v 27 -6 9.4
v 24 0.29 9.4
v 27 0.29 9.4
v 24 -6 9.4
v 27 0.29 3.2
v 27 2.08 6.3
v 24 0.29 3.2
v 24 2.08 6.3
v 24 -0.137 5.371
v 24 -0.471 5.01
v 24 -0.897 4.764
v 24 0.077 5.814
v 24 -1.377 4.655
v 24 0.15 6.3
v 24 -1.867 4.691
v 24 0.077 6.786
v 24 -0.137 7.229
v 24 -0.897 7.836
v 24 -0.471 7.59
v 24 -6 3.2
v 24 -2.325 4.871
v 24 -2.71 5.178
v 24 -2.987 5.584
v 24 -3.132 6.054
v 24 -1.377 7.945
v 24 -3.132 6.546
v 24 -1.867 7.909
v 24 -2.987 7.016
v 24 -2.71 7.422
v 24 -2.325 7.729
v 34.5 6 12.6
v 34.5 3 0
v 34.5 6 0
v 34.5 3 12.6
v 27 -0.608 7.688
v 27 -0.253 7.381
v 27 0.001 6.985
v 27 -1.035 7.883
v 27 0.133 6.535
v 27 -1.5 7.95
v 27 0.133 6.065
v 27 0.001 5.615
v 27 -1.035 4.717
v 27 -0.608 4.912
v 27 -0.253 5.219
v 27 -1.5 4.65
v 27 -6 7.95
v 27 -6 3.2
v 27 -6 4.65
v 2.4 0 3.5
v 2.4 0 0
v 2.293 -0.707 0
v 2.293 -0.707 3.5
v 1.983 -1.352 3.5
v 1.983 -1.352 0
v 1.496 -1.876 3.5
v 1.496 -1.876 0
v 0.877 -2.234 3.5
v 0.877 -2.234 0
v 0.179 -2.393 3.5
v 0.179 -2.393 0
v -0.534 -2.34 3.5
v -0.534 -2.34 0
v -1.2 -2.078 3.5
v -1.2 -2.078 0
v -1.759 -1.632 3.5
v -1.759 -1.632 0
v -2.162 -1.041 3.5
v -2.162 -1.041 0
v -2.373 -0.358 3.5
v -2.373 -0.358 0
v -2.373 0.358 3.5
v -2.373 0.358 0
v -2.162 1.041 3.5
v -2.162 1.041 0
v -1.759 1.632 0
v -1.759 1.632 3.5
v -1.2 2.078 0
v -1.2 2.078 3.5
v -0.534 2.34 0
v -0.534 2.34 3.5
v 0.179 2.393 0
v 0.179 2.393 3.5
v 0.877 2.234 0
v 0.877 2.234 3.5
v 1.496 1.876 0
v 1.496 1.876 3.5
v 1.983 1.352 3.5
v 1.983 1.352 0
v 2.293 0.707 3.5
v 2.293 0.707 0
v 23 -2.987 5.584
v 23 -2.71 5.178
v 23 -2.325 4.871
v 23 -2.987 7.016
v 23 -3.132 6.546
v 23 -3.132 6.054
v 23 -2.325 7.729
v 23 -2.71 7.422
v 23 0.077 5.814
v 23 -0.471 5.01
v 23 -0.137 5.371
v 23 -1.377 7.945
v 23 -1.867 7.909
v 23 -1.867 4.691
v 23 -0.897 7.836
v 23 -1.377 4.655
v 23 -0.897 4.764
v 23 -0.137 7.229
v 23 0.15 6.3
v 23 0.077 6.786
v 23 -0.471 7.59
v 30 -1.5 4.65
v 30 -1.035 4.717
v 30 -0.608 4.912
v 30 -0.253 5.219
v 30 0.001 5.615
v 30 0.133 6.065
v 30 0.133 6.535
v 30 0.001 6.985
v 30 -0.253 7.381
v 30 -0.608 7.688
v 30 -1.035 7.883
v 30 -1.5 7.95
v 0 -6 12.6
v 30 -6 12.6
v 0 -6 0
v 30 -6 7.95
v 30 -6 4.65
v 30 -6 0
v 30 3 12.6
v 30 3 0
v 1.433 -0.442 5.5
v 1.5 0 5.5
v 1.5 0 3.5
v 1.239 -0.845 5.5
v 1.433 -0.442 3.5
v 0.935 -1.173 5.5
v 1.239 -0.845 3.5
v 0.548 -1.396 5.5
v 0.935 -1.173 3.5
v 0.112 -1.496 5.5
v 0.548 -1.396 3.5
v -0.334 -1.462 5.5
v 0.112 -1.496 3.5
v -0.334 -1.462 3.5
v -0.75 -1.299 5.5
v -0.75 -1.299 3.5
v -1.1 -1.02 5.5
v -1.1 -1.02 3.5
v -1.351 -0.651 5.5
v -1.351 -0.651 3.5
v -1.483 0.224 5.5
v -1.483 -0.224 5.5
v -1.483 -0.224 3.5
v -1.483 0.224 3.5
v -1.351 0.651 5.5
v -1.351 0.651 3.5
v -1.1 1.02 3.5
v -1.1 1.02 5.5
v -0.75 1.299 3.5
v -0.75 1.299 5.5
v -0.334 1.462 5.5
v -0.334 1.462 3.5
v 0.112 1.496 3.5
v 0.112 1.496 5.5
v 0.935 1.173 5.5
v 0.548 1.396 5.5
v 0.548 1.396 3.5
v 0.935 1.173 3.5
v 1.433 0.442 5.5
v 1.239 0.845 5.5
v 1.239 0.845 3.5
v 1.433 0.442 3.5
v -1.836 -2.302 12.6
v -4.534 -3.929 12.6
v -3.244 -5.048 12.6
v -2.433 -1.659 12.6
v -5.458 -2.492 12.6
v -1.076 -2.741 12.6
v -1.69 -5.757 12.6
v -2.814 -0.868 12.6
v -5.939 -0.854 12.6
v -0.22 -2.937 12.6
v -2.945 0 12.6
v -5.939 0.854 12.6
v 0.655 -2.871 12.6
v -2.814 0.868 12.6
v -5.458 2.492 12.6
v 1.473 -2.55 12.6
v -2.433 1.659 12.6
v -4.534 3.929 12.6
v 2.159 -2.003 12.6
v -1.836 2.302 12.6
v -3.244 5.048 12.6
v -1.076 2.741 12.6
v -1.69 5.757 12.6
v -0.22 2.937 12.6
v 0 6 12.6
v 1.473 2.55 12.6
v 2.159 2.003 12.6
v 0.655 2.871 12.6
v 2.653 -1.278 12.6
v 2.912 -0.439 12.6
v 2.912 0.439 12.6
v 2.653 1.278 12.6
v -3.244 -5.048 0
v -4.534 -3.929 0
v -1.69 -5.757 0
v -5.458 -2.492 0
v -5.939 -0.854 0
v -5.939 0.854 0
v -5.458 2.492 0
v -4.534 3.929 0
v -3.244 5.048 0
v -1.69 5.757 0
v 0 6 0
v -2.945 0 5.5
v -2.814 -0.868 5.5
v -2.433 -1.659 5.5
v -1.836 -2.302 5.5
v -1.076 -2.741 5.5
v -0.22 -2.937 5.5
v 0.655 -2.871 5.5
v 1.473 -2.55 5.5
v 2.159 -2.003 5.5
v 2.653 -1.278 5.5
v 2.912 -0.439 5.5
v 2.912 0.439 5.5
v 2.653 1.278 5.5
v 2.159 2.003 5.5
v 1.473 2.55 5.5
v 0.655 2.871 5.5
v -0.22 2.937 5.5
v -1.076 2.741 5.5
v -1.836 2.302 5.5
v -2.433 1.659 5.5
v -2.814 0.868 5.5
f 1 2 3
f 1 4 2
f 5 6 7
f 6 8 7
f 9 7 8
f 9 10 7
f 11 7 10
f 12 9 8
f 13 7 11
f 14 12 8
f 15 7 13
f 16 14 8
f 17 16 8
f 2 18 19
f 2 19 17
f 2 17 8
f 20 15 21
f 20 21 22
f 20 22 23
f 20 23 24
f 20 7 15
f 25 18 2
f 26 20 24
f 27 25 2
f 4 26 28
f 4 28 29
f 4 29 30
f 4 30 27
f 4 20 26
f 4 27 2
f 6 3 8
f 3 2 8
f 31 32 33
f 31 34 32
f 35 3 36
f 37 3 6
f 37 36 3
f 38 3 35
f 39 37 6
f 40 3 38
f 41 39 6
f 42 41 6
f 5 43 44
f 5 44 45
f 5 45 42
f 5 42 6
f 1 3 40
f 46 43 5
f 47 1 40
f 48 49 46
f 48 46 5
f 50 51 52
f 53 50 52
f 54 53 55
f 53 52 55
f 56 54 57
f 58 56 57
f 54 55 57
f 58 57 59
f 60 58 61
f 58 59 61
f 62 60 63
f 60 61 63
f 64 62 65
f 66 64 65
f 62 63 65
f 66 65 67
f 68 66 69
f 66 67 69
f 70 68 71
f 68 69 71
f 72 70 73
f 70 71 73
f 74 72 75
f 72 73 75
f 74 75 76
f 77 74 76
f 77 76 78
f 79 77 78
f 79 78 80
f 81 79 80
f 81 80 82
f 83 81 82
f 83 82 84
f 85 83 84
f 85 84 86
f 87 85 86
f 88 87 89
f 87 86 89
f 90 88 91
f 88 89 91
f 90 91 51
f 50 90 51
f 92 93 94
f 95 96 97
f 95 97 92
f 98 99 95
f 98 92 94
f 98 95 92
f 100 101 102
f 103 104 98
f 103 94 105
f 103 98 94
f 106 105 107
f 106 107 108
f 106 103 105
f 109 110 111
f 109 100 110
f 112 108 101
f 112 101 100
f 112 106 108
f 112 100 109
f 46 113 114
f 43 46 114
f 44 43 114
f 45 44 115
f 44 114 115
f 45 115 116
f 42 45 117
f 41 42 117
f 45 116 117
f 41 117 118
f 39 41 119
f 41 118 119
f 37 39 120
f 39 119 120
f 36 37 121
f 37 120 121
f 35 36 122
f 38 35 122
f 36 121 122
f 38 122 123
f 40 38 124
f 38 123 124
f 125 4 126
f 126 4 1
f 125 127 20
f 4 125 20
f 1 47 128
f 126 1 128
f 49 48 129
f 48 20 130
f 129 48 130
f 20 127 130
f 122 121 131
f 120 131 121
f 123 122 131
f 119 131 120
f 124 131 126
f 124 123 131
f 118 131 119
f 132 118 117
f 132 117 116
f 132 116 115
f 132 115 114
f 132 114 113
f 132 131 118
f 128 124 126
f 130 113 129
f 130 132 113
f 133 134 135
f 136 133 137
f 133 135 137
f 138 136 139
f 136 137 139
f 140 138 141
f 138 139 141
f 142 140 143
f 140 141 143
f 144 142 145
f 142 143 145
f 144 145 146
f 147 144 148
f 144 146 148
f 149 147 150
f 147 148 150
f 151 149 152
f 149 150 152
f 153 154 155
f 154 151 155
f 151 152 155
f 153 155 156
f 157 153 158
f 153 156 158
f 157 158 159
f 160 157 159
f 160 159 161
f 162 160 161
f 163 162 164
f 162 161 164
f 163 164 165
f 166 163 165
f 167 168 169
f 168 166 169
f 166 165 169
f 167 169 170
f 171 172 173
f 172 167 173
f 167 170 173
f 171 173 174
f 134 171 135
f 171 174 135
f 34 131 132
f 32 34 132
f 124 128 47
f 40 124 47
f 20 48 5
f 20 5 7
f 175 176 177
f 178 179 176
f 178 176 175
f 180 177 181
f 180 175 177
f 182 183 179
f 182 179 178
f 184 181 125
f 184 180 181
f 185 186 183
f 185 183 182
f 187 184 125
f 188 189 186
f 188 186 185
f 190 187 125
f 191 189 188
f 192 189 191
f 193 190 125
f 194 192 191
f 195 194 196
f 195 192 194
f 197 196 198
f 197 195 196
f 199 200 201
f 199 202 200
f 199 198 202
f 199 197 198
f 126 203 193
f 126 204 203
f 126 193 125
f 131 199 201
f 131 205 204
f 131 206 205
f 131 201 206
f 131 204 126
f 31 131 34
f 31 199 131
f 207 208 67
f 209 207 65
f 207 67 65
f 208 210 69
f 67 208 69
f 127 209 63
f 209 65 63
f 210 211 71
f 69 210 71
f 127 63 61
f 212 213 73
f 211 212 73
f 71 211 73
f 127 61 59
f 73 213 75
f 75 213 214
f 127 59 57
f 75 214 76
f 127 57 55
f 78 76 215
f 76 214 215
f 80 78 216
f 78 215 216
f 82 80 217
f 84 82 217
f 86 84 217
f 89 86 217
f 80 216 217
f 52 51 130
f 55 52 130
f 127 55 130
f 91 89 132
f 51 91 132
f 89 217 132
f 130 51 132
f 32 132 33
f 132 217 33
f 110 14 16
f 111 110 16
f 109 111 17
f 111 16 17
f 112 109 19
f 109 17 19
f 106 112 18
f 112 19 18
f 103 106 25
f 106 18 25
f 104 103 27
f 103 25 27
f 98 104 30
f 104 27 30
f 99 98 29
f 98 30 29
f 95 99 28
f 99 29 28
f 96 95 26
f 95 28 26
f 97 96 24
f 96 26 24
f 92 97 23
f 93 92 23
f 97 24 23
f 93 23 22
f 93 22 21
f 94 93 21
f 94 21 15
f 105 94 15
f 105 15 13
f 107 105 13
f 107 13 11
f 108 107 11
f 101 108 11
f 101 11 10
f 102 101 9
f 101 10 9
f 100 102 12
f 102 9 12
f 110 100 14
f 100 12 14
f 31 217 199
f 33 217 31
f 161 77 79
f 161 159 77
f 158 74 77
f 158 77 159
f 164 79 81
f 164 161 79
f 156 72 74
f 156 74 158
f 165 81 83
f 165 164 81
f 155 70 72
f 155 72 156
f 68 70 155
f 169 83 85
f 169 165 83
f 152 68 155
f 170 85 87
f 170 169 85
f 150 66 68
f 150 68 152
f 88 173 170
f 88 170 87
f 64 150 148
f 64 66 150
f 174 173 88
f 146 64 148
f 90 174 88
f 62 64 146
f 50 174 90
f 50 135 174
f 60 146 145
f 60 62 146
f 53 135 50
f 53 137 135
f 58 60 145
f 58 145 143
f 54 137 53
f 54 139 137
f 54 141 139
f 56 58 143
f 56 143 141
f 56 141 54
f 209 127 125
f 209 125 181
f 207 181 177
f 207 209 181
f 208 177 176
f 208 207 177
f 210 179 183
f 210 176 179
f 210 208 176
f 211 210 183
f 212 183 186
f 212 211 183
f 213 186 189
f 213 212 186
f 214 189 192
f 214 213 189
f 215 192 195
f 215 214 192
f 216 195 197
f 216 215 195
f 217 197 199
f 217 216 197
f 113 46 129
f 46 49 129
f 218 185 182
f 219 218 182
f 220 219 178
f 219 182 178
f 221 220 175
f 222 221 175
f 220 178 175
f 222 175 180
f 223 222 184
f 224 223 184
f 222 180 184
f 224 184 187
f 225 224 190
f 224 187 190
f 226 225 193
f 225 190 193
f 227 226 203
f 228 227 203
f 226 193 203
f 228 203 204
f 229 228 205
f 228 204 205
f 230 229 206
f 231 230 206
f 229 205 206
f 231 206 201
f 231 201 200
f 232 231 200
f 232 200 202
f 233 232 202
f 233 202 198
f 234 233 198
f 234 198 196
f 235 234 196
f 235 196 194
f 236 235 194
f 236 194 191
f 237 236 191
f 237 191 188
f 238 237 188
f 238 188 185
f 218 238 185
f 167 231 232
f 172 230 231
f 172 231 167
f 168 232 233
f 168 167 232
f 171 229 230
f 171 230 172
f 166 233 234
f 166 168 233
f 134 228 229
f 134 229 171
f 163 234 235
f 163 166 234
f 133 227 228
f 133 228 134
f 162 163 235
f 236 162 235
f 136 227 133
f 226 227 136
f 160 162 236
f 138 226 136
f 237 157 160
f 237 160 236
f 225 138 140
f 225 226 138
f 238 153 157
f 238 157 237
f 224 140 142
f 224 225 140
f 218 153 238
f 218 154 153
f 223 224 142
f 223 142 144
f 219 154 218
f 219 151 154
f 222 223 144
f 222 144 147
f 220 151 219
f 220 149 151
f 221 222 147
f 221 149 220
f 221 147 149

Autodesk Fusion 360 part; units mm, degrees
sketch "Sketch1" plane through (0, 0, 0) normal (0, 0, 1) x (1, 0, 0)
  circle A0 centre (0, 0) radius 1.5
  line L0 (0, 6) -> (30, 6)
  line L1 (0, -6) -> (30, -6)
  arc A1 (0, 6) -> (0, -6) centre (0, 0) ccw
  line L2 (30, 6) -> (30, -6)
  dimension "d1" = 3
  dimension "d3" = 12
  dimension "d4" = 30
extrude "Extrude1" add sketch "Sketch1" along normal blind 12.6 makes body 1
sketch "Sketch2" plane through (30, 0, 0) normal (1, 0, 0) x (0, 1, 0)
  line L0 (-6, 0) -> (6, 0)
  line L1 (6, 0) -> (6, 12.6)
  line L2 (6, 12.6) -> (-6, 12.6)
  line L3 (-6, 12.6) -> (-6, 0)
  line L4 (6, 12.6) -> (3, 12.6)
  line L5 (3, 12.6) -> (3, 0)
  line L6 (3, 0) -> (6, 0)
  line L7 (6, 0) -> (6, 12.6)
  dimension "d7" = 3
extrude "Extrude2" add sketch "Sketch2" along normal blind 4.5 contours L0 L1 L2 L4 L5 L6 L7 bodies 1
ref_plane "WorkPlane1" through (14.25, 0, 6.3) normal (0, 0, 1) x (1, 0, 0)
ref_plane "WorkPlane2" through (15, 0, 6.3) normal (0, -1, 0) x (1, 0, 0)
sketch "Sketch3" plane through (0, -6, 0) normal (0, -1, 0) x (1, 0, 0)
  line L0 (0, 0) -> (30, 0)
  line L1 (30, 0) -> (30, 12.6)
  line L2 (30, 12.6) -> (0, 12.6)
  line L3 (0, 12.6) -> (0, 0)
  line L4 (13, 10.8) -> (24, 10.8)
  line L5 (24, 10.8) -> (24, 1.8)
  line L6 (24, 1.8) -> (13, 1.8)
  line L7 (13, 1.8) -> (13, 10.8)
  point P0 (30, 6.3)
  point P1 (24, 6.3)
  dimension "d15" = 9
  dimension "d16" = 11
  dimension "d17" = 6
sketch "Sketch6" plane through (0, -6, 0) normal (0, -1, 0) x (1, 0, 0)
  line L0 (0, 0) -> (30, 0)
  line L1 (30, 0) -> (30, 12.6)
  line L2 (30, 12.6) -> (0, 12.6)
  line L3 (0, 12.6) -> (0, 0)
  line L4 (24, 9.4) -> (27, 9.4)
  line L5 (27, 3.2) -> (24, 3.2)
  line L6 (24, 3.2) -> (24, 9.4)
  line L7 (27, 4.65) -> (30, 4.65)
  line L8 (30, 4.65) -> (30, 7.95)
  line L9 (30, 7.95) -> (27, 7.95)
  line L10 (27, 9.4) -> (27, 7.95)
  line L11 (27, 4.65) -> (27, 3.2)
  dimension "d28" = 3
  dimension "d29" = 3
  dimension "d30" = 3.3
  dimension "d39" = 6.2
ref_plane "WorkPlane3" through (15, -1.5, 6.3) normal (0, -1, 0) x (1, 0, 0)
extrude "Extrude6" cut sketch "Sketch6" against normal up to surface (4.5 mm away) contours L1 L4 L5 L6 L7 L8 L9 L10 L11 bodies 1
sketch "Sketch7" plane through (30, 0, 0) normal (1, 0, 0) x (0, 1, 0)
  line L0 (-6, 7.95) -> (-1.5, 7.95)
  line L1 (-1.5, 7.95) -> (-1.5, 4.65)
  line L2 (-1.5, 4.65) -> (-6, 4.65)
  line L3 (-6, 4.65) -> (-6, 0)
  line L4 (-6, 0) -> (3, 0)
  line L5 (3, 0) -> (3, 12.6)
  line L6 (3, 12.6) -> (-6, 12.6)
  line L7 (-6, 12.6) -> (-6, 7.95)
  circle A0 centre (-1.5, 6.3) radius 1.65
extrude "Extrude7" cut sketch "Sketch7" against normal blind 7 contours L1 A0 | L1 A0 bodies 1
sketch "Sketch8" plane through (24, 0, 0) normal (1, 0, 0) x (0, 1, 0)
  arc A0 (-1.5, 7.95) -> (-1.5, 4.65) centre (-1.5, 6.3) ccw
  line L0 (-1.5, 7.95) -> (-1.5, 9.4)
  line L1 (-1.5, 9.4) -> (-6, 9.4)
  line L2 (-6, 9.4) -> (-6, 3.2)
  line L3 (-6, 3.2) -> (-1.5, 3.2)
  line L4 (-1.5, 3.2) -> (-1.5, 4.65)
  line L5 (-3.2898, 9.4) -> (0.2898, 9.4)
  line L6 (0.2898, 9.4) -> (2.0796, 6.3)
  line L7 (2.0796, 6.3) -> (0.2898, 3.2)
  line L8 (0.2898, 3.2) -> (-3.2898, 3.2)
  line L9 (-3.2898, 3.2) -> (-5.0796, 6.3)
  line L10 (-5.0796, 6.3) -> (-3.2898, 9.4)
  line L11 (-1.5, 9.4) -> (-1.5, 3.2) construction
  point P0 (-1.5, 9.4)
  point P1 (-1.5, 3.2)
  point P2 (-1.5, 6.3)
  dimension "d36" = 120
extrude "Extrude8" cut sketch "Sketch8" along normal up to surface (3 mm away) contours A0 L0 L4 L5 L6 L7 L8 | A0 L0 L1 L3 L4 L5 L8 L9 L10 bodies 1
sketch "Sketch10" plane through (0, 0, 12.6) normal (0, 0, 1) x (-1, 0, 0)
  circle A0 centre (0, 0) radius 1.5
  arc A1 (0, -6) -> (0, 6) centre (0, 0) ccw
  line L0 (0, 6) -> (-30, 6)
  line L1 (-30, 6) -> (-30, -3)
  line L2 (-30, -3) -> (-34.5, -3)
  line L3 (-34.5, -3) -> (-34.5, -6)
  line L4 (-34.5, -6) -> (0, -6)
  circle A2 centre (0, 0) radius 2.945
  dimension "d40" = 5.89
extrude "Extrude9" cut sketch "Sketch10" against normal blind 7.1 contours A2 bodies 1
sketch "Sketch11" plane through (0, 0, 0) normal (0, 0, -1) x (1, 0, 0)
  circle A0 centre (0, 0) radius 1.5
  arc A1 (0, 6) -> (0, -6) centre (0, 0) ccw
  line L0 (0, -6) -> (34.5, -6)
  line L1 (34.5, -6) -> (34.5, -3)
  line L2 (34.5, -3) -> (30, -3)
  line L3 (30, -3) -> (30, 6)
  line L4 (30, 6) -> (0, 6)
  circle A2 centre (0, 0) radius 2.4
  dimension "d43" = 4.8
extrude "Extrude10" cut sketch "Sketch11" against normal blind 3.5 contours A2 bodies 1
copy_body "Body->Comp1" bodies 1 removing the originals makes body 2 in component "Component"
sketch "Sketch12" plane through (0, -6, 0) normal (0, -1, 0) x (1, 0, 0)
  line L0 (27, 7.95) -> (30, 7.95)
  line L1 (30, 7.95) -> (30, 12.6)
  line L2 (30, 12.6) -> (0, 12.6)
  line L3 (0, 12.6) -> (0, 0)
  line L4 (0, 0) -> (30, 0)
  line L5 (30, 0) -> (30, 4.65)
  line L6 (30, 4.65) -> (27, 4.65)
  line L7 (27, 4.65) -> (27, 3.2)
  line L8 (27, 3.2) -> (24.6, 3.2)
  line L9 (24.6, 3.2) -> (24.6, 9.4)
  line L10 (24.6, 9.4) -> (27, 9.4)
  line L11 (27, 9.4) -> (27, 7.95)
  line L12 (-8, 12.6) -> (20, 12.6)
  line L13 (20, 12.6) -> (20, 0)
  line L14 (20, 0) -> (-8, 0)
  line L15 (-8, 0) -> (-8, 12.6)
extrude "Extrude11" [suppressed]
component "Component" placed x (1, 0, 0) y (0, 1, 0) z (0, 0, 1) at (0, 0, 0)
